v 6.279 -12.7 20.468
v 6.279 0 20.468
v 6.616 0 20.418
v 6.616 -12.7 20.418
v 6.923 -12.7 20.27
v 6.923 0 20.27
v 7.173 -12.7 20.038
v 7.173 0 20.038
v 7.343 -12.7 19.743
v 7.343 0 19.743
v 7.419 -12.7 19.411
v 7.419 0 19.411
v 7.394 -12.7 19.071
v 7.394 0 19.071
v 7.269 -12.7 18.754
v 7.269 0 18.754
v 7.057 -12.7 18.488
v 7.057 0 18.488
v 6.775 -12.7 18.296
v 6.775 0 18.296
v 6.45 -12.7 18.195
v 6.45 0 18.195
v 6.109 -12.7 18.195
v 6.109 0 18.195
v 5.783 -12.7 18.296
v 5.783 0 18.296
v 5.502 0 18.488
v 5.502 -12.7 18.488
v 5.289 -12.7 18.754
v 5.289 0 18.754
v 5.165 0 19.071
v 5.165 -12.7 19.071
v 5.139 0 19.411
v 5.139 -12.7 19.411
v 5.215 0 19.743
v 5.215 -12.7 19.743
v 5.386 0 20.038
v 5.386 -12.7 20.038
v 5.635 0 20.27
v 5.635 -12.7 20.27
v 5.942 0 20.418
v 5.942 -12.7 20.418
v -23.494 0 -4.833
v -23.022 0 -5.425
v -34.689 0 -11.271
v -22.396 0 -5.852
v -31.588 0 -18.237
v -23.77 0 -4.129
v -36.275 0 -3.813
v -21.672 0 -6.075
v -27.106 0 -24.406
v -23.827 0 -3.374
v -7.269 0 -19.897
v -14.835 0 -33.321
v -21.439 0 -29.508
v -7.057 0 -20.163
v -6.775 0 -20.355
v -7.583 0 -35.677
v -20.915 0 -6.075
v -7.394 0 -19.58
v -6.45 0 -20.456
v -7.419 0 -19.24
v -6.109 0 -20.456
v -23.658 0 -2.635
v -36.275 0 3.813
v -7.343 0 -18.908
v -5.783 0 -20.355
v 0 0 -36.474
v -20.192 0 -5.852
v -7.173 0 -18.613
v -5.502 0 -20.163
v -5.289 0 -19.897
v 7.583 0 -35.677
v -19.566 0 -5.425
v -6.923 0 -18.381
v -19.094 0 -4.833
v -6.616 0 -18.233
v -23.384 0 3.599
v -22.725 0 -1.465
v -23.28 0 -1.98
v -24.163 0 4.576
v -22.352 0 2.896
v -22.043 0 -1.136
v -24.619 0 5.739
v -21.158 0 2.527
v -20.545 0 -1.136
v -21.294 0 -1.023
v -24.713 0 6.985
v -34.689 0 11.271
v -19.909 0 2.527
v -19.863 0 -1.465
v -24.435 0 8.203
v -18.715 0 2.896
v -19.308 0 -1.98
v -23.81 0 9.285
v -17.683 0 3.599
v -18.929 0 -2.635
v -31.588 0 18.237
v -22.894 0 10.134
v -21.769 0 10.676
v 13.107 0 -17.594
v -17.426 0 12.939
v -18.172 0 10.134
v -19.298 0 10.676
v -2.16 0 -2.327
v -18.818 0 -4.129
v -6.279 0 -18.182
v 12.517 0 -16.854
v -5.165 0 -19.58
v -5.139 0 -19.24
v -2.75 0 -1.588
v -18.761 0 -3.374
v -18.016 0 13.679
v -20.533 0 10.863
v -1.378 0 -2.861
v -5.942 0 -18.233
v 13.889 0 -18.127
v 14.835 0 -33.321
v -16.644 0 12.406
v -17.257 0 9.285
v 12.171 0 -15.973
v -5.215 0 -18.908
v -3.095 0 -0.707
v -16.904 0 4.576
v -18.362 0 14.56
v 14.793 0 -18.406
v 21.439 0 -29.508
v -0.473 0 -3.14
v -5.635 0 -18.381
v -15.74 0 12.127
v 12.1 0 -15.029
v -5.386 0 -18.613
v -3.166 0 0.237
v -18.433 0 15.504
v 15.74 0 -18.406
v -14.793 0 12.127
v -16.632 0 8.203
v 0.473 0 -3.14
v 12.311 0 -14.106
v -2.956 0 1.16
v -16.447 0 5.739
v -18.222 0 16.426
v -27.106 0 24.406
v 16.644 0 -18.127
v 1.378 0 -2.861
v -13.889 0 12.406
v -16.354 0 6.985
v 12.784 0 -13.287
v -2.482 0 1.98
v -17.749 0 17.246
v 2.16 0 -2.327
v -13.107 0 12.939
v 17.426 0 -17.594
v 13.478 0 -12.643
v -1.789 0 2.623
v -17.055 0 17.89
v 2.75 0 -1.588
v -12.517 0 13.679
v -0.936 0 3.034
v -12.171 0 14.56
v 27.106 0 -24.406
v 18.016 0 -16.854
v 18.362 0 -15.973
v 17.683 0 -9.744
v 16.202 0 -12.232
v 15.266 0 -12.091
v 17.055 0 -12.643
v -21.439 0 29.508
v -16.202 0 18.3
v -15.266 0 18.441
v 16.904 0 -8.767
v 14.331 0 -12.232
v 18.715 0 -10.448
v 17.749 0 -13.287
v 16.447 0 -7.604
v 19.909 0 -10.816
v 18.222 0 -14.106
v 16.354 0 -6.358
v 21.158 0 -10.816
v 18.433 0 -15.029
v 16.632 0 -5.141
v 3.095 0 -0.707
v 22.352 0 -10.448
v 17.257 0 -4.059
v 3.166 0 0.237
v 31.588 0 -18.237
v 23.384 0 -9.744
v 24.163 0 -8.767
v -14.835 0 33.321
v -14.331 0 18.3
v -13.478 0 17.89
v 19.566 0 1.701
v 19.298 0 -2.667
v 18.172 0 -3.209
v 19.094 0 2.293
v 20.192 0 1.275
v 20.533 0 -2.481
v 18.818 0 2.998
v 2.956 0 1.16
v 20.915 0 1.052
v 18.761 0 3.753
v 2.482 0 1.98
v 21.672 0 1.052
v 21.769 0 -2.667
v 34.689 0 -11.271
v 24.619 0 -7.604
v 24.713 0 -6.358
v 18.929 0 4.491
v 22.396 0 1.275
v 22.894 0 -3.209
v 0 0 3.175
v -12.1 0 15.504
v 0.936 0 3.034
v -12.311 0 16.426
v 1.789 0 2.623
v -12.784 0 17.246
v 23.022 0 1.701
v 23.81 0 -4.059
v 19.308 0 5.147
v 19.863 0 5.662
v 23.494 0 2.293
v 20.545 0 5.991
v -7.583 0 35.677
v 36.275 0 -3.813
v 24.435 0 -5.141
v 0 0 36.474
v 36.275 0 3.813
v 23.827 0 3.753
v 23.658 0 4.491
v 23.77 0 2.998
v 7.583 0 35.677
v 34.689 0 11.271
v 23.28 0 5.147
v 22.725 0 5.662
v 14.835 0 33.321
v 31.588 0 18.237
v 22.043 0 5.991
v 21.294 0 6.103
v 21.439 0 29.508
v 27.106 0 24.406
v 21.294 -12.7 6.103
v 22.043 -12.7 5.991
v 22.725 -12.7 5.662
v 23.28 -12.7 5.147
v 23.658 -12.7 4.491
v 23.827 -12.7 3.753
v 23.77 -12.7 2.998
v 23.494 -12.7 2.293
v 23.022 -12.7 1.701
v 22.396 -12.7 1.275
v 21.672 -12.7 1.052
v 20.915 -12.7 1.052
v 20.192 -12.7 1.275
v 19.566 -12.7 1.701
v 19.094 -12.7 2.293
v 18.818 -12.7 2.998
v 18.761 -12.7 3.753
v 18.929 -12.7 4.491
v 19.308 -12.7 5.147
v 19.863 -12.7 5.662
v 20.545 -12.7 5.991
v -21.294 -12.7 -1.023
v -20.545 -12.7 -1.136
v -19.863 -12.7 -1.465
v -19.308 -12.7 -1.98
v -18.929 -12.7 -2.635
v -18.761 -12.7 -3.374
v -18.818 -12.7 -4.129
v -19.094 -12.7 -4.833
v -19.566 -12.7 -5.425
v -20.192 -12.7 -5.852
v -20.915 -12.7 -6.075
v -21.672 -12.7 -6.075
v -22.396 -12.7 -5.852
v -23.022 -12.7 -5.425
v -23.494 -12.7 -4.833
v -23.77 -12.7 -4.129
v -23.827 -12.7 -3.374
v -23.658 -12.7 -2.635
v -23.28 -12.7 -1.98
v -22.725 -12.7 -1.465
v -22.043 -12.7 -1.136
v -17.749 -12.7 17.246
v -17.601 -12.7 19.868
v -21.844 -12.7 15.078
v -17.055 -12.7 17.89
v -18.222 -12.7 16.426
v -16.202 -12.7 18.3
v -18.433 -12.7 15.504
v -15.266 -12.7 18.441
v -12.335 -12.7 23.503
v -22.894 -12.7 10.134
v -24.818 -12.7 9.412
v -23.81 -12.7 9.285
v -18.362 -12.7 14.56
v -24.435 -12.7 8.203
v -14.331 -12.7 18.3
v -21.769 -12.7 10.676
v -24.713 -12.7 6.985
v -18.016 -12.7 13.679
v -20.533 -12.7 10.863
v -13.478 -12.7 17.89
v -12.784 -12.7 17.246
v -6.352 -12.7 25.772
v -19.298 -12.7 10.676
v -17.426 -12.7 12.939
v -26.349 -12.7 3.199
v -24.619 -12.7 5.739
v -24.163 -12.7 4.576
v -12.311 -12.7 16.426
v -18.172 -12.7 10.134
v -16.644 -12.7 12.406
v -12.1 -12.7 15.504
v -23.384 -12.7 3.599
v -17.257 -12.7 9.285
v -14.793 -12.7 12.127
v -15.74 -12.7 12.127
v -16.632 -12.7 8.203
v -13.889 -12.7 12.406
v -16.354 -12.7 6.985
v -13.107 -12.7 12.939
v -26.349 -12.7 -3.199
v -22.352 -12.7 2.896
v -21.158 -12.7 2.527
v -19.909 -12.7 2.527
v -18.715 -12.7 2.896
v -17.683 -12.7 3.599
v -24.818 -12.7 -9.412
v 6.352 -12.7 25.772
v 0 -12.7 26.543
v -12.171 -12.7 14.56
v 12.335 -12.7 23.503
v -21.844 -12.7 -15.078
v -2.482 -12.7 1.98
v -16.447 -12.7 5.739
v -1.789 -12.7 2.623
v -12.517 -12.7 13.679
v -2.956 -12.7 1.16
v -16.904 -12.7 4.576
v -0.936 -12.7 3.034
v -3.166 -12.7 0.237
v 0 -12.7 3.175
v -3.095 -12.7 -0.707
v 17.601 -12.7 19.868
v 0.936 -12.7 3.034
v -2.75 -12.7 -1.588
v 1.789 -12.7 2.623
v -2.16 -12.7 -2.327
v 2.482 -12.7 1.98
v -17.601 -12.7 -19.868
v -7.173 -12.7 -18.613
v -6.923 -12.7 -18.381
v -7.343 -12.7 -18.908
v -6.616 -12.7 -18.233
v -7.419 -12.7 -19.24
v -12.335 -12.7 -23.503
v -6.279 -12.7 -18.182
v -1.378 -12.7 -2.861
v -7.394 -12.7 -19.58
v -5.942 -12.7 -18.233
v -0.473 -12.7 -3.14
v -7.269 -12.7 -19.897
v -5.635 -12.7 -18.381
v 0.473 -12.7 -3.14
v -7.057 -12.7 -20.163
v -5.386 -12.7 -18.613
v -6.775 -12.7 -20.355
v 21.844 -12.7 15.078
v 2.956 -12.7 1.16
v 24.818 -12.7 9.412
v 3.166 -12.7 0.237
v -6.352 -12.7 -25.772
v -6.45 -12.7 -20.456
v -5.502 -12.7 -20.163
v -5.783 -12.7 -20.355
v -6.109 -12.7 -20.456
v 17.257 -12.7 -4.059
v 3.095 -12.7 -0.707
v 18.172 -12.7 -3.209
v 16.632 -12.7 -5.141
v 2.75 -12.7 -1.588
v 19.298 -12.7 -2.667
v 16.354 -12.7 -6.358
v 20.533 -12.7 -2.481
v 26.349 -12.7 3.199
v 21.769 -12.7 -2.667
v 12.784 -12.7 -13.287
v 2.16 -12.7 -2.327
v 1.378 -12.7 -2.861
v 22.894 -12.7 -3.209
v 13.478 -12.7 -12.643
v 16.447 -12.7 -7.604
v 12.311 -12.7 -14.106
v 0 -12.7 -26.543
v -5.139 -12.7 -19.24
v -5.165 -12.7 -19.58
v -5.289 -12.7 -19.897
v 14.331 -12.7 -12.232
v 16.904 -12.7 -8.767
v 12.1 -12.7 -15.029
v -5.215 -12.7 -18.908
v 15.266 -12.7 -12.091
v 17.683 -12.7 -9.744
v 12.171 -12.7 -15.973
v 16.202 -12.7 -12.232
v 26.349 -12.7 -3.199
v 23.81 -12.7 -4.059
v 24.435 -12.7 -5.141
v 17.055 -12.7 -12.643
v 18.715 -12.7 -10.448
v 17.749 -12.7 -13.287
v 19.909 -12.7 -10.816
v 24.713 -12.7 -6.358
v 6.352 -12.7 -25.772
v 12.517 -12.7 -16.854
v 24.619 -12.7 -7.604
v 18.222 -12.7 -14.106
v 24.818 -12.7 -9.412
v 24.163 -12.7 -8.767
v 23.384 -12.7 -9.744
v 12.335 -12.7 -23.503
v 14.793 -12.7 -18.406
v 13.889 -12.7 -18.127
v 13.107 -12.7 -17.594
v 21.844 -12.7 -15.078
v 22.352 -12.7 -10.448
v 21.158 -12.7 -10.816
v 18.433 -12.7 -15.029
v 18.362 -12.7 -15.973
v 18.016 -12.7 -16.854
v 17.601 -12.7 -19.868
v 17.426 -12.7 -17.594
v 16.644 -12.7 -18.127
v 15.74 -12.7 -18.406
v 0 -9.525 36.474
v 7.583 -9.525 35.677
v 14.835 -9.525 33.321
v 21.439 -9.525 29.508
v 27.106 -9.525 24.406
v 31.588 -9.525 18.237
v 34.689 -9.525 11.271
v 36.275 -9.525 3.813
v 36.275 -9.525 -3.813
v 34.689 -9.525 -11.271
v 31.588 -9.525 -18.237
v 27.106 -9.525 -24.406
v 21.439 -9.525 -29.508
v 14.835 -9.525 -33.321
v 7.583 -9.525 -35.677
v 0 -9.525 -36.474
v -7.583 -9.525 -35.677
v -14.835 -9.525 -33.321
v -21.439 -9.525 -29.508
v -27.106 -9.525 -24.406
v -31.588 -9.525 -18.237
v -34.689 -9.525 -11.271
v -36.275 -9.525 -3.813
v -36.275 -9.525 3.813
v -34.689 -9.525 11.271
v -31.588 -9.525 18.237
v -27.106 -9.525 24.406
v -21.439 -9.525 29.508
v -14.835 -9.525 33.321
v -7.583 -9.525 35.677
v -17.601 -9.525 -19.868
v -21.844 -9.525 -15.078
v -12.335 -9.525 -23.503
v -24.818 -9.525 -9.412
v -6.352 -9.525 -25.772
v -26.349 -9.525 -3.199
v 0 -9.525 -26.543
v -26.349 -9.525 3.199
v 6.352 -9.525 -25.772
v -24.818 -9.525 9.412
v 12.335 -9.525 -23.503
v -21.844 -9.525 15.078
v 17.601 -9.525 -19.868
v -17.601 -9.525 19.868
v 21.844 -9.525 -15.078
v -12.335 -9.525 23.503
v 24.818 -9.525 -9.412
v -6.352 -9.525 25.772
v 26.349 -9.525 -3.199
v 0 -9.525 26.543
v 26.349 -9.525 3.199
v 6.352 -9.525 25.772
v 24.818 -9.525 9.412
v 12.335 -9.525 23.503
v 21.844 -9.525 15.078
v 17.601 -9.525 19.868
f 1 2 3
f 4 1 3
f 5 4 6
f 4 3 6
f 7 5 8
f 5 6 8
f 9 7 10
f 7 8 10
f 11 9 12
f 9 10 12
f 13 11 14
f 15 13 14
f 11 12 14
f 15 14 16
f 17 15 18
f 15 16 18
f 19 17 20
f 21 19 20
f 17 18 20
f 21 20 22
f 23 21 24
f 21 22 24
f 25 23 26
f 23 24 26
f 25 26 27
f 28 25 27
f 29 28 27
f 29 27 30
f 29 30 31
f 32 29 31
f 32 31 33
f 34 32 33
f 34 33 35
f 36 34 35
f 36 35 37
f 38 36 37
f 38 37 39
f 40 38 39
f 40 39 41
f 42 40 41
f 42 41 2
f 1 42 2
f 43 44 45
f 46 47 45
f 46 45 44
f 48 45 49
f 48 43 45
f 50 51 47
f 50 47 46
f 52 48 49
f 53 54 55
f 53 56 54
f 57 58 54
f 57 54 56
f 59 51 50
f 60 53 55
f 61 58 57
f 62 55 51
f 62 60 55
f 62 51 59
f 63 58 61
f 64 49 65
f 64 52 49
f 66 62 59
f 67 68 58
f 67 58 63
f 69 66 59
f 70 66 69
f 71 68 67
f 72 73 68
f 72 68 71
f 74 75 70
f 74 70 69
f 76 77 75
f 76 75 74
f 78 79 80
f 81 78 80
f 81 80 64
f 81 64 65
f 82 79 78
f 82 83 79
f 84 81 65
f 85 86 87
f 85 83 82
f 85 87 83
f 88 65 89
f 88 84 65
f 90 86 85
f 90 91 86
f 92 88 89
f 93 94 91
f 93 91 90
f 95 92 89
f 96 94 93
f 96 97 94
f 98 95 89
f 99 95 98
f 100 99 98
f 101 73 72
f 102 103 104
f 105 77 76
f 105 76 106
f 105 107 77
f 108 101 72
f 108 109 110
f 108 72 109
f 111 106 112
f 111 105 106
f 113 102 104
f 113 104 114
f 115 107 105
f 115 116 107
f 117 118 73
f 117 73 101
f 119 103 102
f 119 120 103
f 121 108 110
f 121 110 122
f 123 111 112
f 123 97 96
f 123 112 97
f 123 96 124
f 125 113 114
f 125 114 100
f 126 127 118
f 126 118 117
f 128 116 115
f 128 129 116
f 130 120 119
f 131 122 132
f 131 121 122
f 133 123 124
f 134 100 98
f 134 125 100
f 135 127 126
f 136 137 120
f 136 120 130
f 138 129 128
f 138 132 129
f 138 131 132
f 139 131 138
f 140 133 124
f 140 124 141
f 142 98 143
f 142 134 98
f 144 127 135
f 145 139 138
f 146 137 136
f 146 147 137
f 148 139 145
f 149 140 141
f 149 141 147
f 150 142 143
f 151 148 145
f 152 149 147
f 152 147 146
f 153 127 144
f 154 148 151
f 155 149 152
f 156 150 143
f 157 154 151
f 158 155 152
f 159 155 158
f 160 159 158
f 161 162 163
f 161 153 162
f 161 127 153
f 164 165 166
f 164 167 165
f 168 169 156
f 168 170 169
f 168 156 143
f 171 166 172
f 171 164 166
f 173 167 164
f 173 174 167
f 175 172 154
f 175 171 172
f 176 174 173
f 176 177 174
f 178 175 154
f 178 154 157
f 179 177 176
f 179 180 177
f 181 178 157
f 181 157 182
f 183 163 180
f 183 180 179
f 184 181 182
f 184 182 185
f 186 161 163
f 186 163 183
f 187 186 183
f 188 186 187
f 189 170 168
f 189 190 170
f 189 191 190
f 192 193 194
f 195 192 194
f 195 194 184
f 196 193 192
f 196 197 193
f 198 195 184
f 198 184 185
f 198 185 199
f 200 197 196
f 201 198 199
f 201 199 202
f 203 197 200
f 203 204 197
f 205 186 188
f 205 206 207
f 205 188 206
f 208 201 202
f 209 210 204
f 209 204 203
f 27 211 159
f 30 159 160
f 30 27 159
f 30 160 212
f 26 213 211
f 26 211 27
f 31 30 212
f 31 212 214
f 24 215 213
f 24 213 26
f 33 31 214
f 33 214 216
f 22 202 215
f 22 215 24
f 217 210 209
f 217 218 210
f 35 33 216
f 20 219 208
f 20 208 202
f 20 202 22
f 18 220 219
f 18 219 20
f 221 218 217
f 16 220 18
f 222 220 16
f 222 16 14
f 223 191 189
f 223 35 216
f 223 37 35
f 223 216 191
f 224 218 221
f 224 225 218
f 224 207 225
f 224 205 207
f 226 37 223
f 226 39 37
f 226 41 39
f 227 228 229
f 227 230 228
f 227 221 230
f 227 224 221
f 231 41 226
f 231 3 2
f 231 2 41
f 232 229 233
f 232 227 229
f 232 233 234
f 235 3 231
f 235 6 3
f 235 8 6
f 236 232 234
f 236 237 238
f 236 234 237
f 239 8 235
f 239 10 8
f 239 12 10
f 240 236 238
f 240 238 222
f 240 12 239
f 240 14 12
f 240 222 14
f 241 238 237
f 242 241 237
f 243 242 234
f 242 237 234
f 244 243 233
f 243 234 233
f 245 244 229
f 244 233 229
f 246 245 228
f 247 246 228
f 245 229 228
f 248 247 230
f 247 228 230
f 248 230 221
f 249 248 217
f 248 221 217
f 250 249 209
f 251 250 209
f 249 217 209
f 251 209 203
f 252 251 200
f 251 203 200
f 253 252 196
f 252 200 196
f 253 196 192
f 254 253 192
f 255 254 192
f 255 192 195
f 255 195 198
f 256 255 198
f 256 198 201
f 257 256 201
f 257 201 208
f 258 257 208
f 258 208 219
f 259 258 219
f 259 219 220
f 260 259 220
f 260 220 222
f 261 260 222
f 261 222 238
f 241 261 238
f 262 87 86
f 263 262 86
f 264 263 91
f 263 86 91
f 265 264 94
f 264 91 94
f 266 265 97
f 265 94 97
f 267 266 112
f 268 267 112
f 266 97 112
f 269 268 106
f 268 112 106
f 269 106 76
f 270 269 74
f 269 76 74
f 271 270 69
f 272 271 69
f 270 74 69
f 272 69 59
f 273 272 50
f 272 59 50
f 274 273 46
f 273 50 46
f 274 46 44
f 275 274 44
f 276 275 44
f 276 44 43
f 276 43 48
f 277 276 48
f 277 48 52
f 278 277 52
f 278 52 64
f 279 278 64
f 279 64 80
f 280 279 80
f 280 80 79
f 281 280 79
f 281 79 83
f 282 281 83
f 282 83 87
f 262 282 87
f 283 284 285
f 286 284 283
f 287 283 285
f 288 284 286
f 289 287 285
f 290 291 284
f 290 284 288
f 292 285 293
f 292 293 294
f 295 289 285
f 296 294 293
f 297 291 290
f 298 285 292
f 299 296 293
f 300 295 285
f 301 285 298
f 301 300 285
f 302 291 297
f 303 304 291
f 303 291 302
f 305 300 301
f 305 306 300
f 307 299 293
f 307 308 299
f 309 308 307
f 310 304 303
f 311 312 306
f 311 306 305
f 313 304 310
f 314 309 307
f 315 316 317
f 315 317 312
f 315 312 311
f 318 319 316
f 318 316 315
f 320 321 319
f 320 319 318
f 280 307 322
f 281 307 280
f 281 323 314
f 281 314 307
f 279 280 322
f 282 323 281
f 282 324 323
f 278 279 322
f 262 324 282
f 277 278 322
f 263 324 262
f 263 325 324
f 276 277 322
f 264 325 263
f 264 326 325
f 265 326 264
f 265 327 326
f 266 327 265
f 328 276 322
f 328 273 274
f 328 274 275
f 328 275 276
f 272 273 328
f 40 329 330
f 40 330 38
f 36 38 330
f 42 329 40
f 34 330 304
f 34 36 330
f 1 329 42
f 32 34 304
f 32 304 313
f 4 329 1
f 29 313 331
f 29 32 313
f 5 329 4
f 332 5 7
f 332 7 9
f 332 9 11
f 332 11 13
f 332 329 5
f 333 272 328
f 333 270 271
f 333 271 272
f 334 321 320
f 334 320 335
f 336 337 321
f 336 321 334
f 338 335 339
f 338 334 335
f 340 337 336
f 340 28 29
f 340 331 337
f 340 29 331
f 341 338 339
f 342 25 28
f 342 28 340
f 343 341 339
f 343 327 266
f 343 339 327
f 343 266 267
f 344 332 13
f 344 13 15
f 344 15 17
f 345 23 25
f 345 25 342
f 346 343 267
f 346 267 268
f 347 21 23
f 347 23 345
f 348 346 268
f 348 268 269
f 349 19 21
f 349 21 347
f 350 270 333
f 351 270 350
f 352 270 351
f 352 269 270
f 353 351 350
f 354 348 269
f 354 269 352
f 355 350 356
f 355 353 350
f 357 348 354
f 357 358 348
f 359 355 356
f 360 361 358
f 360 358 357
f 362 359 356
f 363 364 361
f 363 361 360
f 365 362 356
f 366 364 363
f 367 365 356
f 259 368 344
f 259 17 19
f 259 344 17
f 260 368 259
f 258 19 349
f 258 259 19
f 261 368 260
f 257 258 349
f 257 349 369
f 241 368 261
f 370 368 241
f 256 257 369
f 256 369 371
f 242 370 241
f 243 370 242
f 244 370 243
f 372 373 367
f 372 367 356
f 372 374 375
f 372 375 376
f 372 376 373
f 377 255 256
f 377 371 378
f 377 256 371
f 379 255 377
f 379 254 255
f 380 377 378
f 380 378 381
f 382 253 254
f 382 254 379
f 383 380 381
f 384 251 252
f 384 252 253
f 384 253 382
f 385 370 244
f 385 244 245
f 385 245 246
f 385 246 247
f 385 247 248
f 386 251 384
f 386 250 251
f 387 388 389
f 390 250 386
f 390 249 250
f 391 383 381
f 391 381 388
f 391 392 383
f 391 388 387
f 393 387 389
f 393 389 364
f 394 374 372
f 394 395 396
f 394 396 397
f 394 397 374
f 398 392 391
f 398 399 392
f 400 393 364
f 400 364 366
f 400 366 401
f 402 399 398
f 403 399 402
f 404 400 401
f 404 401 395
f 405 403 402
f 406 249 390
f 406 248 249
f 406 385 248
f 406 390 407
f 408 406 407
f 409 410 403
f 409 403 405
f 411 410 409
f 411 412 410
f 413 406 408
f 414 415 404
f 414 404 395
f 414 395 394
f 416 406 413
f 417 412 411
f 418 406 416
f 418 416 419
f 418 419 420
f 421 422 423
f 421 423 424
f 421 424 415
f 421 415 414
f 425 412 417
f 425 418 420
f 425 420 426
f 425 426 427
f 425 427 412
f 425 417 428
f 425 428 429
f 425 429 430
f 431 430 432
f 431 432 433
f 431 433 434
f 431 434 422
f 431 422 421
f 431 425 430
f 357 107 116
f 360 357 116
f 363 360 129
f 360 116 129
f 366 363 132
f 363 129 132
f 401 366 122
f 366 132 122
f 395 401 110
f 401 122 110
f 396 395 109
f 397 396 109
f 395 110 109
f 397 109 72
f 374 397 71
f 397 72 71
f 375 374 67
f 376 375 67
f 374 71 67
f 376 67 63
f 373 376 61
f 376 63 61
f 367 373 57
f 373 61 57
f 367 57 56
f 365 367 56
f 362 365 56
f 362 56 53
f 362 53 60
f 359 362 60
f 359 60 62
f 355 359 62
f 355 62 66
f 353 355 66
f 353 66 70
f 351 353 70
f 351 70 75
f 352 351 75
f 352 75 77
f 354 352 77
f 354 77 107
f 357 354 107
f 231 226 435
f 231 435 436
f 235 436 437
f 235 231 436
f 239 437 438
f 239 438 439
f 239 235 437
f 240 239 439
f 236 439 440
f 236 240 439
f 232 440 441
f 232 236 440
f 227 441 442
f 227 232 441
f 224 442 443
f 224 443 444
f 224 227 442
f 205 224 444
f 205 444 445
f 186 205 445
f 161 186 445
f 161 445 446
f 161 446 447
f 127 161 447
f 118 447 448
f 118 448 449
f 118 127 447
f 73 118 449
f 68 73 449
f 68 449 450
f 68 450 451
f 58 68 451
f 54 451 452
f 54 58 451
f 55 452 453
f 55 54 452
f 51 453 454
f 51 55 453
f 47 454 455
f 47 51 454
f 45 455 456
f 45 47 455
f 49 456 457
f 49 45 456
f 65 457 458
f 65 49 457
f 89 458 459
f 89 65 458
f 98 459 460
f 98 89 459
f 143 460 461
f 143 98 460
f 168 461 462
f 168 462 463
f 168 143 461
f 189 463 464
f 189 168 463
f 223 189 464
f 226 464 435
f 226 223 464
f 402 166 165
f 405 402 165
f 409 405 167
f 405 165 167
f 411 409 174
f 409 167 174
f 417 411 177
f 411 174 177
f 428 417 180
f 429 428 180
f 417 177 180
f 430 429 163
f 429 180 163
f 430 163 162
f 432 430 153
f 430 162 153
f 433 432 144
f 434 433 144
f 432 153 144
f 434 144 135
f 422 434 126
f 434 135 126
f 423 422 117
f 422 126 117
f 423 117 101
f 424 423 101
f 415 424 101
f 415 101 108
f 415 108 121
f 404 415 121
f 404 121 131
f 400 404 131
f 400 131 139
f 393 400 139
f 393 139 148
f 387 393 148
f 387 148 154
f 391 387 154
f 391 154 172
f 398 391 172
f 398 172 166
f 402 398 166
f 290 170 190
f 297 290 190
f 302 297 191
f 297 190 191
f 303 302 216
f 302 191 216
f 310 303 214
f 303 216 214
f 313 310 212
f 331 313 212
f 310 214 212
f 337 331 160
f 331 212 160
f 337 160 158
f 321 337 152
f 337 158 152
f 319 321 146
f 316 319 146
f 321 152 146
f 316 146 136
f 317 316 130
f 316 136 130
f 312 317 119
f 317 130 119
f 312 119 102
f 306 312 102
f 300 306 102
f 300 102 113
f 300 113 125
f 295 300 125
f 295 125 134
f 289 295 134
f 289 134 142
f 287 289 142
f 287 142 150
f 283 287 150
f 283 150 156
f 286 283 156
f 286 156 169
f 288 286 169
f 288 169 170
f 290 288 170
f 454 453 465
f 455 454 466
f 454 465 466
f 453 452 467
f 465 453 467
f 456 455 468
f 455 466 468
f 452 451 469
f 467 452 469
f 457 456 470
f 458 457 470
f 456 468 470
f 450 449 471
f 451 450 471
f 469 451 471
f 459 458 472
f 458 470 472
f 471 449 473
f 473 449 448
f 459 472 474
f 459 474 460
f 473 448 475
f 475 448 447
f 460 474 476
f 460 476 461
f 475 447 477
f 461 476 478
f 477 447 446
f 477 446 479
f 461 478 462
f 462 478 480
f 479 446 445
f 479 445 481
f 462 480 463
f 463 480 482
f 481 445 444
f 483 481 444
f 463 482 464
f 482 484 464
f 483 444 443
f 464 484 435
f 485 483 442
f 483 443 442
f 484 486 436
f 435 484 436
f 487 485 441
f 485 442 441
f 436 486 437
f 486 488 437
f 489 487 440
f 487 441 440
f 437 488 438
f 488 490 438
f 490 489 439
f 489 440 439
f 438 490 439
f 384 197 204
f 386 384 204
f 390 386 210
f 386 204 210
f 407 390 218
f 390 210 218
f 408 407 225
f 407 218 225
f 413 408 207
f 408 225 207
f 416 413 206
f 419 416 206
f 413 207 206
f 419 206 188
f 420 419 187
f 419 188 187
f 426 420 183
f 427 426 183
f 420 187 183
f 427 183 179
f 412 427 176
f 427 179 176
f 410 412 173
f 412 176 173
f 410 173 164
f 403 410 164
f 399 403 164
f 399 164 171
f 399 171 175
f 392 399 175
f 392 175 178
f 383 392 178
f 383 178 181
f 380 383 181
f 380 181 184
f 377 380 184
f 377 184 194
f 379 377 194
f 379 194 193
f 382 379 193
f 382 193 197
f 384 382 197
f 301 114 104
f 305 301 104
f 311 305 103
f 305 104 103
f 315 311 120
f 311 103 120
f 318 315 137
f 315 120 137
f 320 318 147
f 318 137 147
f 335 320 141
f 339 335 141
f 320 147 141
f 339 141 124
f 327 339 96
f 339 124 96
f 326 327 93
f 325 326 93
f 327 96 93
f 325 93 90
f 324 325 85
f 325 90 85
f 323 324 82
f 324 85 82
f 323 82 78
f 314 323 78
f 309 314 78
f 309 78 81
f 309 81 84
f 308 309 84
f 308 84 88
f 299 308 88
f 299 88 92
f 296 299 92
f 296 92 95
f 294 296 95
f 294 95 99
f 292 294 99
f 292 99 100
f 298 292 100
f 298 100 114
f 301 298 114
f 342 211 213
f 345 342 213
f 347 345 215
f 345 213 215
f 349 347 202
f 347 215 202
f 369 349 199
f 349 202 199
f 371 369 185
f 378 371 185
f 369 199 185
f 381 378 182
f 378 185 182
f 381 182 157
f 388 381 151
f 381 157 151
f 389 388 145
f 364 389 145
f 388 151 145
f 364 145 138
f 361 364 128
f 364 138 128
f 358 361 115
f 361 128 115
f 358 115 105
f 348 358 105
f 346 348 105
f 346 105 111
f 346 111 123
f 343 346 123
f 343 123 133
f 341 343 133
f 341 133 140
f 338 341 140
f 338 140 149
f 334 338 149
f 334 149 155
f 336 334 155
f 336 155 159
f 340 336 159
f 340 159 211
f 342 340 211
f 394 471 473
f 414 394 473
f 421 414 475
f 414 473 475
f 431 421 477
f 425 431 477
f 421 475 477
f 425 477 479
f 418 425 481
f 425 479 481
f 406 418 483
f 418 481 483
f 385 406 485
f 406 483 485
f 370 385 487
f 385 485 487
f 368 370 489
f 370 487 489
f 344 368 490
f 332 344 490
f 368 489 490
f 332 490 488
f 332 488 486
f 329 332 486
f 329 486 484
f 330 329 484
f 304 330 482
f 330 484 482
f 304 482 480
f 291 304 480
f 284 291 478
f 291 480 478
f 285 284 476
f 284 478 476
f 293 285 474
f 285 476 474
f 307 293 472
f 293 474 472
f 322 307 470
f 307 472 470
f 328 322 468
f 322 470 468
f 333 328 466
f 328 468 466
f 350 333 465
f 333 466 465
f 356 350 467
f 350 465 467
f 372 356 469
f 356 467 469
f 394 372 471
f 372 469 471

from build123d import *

# Parameters (mm, degrees)
SKETCH1_R           = 36.4744
BOSS_EXTRUDE1_DEPTH = 9.525
SKETCH2_R           = 26.543
BOSS_EXTRUDE2_DEPTH = 3.175
SKETCH5_R           = 3.175
SKETCH5_R_2         = 1.143
SKETCH5_R_3         = 4.191
SKETCH5_R_4         = 2.54
CUT_EXTRUDE1_DEPTH  = 54.123005475


with BuildPart() as part:
    # Sketch1 → Boss-Extrude1 (new body)
    with BuildSketch(Plane(origin=(0, 0, 0), x_dir=(1, 0, 0), z_dir=(0, 1, 0))):
        with Locations(Location((0, 0, 0), (0, 0, 270))):
            Circle(SKETCH1_R)
    extrude(amount=-BOSS_EXTRUDE1_DEPTH)

    # Sketch2 → Boss-Extrude2 (add)
    with BuildSketch(Plane.XZ.offset(9.525)):
        with Locations(Location((0, 0, 0), (0, 0, 270))):
            Circle(SKETCH2_R)
    extrude(amount=BOSS_EXTRUDE2_DEPTH)

    # Sketch5 → Cut-Extrude1 (cut, through all)
    with BuildSketch(Plane(origin=(0, 0, 0), x_dir=(1, 0, 0), z_dir=(0, 1, 0))):
        with Locations(Location((0, 0, 0), (0, 0, 270))):
            Circle(SKETCH5_R)
        with Locations(Location((-6.279225326, 19.325468411, 0), (0, 0, 270))):
            Circle(SKETCH5_R_2)
        with Locations(Location((-20.533310187, -6.671676909, 0), (0, 0, 270))):
            Circle(SKETCH5_R_3)
        with Locations(Location((-15.266435406, -15.266435406, 0), (0, 0, 270))):
            Circle(SKETCH5_R)
        with Locations(Location((15.266435406, 15.266435406, 0), (0, 0, 270))):
            Circle(SKETCH5_R)
        with Locations(Location((6.279225326, -19.325468411, 0), (0, 0, 270))):
            Circle(SKETCH5_R_2)
        with Locations(Location((20.533310187, 6.671676909, 0), (0, 0, 270))):
            Circle(SKETCH5_R_3)
        with Locations(Location((21.293906137, -3.563377811, 0), (0, 0, 270))):
            Circle(SKETCH5_R_4)
        with Locations(Location((-21.293906137, 3.563377811, 0), (0, 0, 270))):
            Circle(SKETCH5_R_4)
    extrude(amount=-CUT_EXTRUDE1_DEPTH, mode=Mode.SUBTRACT)


solid = part.part
